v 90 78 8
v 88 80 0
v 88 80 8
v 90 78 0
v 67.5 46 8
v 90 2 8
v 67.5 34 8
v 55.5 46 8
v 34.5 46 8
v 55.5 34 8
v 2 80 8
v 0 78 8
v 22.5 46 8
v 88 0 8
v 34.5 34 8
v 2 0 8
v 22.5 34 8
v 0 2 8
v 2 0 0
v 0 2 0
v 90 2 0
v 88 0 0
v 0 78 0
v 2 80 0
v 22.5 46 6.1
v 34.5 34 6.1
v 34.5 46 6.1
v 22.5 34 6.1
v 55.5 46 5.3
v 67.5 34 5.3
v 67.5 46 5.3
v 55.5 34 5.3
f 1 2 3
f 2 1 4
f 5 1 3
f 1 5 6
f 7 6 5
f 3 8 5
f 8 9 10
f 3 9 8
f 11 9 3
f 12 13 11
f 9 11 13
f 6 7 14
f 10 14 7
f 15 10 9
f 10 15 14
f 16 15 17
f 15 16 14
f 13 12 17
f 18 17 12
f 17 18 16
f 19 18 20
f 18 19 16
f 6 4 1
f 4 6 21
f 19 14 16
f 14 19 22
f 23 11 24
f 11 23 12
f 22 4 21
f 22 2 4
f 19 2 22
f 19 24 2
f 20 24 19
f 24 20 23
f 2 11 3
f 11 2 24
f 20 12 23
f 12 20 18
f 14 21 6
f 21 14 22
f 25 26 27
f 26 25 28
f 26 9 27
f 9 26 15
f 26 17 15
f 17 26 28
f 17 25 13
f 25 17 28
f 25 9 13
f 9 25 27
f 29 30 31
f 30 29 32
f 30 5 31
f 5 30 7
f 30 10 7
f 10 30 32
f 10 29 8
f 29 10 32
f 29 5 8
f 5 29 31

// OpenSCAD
$fn = 32;

// ----------------------------------------------------------------------
// Windowed plate: 2 voids, 90 x 80 x 8 mm
// ----------------------------------------------------------------------

// --- parameters (mm) ---
plate_l = 90;             // plate length, X
plate_w = 80;             // plate width, Y
plate_t = 8;              // plate thickness, Z
edge_margin = 12;         // wall from the plate edge to any window
windows = 2;              // number of windows in the row
win_l = 12;               // window length
win_w = 12;               // window width
win_pitch = 33;           // window pitch along X
depth_1 = 1.9;            // depth of void 1 (full thickness = through)
depth_2 = 2.7;            // depth of void 2 (full thickness = through)
corner_c = 2;             // corner chamfer of the plate

profile = [[2, 0], [88, 0], [90, 2], [90, 78], [88, 80], [2, 80], [0, 78], [0, 2]];  // primary outline, 8 points, counter clockwise
void_1 = [[22.5, 34], [34.5, 34], [34.5, 46], [22.5, 46]];  // window 1 of the row, 4 points
void_2 = [[55.5, 34], [67.5, 34], [67.5, 46], [55.5, 46]];  // window 2 of the row, 4 points

// --- the one profile operation ---
difference() {
  linear_extrude(height = plate_t) polygon(points = profile);
  translate([0, 0, plate_t - depth_1])
    linear_extrude(height = depth_1 + 1) polygon(points = void_1);
  translate([0, 0, plate_t - depth_2])
    linear_extrude(height = depth_2 + 1) polygon(points = void_2);
}
